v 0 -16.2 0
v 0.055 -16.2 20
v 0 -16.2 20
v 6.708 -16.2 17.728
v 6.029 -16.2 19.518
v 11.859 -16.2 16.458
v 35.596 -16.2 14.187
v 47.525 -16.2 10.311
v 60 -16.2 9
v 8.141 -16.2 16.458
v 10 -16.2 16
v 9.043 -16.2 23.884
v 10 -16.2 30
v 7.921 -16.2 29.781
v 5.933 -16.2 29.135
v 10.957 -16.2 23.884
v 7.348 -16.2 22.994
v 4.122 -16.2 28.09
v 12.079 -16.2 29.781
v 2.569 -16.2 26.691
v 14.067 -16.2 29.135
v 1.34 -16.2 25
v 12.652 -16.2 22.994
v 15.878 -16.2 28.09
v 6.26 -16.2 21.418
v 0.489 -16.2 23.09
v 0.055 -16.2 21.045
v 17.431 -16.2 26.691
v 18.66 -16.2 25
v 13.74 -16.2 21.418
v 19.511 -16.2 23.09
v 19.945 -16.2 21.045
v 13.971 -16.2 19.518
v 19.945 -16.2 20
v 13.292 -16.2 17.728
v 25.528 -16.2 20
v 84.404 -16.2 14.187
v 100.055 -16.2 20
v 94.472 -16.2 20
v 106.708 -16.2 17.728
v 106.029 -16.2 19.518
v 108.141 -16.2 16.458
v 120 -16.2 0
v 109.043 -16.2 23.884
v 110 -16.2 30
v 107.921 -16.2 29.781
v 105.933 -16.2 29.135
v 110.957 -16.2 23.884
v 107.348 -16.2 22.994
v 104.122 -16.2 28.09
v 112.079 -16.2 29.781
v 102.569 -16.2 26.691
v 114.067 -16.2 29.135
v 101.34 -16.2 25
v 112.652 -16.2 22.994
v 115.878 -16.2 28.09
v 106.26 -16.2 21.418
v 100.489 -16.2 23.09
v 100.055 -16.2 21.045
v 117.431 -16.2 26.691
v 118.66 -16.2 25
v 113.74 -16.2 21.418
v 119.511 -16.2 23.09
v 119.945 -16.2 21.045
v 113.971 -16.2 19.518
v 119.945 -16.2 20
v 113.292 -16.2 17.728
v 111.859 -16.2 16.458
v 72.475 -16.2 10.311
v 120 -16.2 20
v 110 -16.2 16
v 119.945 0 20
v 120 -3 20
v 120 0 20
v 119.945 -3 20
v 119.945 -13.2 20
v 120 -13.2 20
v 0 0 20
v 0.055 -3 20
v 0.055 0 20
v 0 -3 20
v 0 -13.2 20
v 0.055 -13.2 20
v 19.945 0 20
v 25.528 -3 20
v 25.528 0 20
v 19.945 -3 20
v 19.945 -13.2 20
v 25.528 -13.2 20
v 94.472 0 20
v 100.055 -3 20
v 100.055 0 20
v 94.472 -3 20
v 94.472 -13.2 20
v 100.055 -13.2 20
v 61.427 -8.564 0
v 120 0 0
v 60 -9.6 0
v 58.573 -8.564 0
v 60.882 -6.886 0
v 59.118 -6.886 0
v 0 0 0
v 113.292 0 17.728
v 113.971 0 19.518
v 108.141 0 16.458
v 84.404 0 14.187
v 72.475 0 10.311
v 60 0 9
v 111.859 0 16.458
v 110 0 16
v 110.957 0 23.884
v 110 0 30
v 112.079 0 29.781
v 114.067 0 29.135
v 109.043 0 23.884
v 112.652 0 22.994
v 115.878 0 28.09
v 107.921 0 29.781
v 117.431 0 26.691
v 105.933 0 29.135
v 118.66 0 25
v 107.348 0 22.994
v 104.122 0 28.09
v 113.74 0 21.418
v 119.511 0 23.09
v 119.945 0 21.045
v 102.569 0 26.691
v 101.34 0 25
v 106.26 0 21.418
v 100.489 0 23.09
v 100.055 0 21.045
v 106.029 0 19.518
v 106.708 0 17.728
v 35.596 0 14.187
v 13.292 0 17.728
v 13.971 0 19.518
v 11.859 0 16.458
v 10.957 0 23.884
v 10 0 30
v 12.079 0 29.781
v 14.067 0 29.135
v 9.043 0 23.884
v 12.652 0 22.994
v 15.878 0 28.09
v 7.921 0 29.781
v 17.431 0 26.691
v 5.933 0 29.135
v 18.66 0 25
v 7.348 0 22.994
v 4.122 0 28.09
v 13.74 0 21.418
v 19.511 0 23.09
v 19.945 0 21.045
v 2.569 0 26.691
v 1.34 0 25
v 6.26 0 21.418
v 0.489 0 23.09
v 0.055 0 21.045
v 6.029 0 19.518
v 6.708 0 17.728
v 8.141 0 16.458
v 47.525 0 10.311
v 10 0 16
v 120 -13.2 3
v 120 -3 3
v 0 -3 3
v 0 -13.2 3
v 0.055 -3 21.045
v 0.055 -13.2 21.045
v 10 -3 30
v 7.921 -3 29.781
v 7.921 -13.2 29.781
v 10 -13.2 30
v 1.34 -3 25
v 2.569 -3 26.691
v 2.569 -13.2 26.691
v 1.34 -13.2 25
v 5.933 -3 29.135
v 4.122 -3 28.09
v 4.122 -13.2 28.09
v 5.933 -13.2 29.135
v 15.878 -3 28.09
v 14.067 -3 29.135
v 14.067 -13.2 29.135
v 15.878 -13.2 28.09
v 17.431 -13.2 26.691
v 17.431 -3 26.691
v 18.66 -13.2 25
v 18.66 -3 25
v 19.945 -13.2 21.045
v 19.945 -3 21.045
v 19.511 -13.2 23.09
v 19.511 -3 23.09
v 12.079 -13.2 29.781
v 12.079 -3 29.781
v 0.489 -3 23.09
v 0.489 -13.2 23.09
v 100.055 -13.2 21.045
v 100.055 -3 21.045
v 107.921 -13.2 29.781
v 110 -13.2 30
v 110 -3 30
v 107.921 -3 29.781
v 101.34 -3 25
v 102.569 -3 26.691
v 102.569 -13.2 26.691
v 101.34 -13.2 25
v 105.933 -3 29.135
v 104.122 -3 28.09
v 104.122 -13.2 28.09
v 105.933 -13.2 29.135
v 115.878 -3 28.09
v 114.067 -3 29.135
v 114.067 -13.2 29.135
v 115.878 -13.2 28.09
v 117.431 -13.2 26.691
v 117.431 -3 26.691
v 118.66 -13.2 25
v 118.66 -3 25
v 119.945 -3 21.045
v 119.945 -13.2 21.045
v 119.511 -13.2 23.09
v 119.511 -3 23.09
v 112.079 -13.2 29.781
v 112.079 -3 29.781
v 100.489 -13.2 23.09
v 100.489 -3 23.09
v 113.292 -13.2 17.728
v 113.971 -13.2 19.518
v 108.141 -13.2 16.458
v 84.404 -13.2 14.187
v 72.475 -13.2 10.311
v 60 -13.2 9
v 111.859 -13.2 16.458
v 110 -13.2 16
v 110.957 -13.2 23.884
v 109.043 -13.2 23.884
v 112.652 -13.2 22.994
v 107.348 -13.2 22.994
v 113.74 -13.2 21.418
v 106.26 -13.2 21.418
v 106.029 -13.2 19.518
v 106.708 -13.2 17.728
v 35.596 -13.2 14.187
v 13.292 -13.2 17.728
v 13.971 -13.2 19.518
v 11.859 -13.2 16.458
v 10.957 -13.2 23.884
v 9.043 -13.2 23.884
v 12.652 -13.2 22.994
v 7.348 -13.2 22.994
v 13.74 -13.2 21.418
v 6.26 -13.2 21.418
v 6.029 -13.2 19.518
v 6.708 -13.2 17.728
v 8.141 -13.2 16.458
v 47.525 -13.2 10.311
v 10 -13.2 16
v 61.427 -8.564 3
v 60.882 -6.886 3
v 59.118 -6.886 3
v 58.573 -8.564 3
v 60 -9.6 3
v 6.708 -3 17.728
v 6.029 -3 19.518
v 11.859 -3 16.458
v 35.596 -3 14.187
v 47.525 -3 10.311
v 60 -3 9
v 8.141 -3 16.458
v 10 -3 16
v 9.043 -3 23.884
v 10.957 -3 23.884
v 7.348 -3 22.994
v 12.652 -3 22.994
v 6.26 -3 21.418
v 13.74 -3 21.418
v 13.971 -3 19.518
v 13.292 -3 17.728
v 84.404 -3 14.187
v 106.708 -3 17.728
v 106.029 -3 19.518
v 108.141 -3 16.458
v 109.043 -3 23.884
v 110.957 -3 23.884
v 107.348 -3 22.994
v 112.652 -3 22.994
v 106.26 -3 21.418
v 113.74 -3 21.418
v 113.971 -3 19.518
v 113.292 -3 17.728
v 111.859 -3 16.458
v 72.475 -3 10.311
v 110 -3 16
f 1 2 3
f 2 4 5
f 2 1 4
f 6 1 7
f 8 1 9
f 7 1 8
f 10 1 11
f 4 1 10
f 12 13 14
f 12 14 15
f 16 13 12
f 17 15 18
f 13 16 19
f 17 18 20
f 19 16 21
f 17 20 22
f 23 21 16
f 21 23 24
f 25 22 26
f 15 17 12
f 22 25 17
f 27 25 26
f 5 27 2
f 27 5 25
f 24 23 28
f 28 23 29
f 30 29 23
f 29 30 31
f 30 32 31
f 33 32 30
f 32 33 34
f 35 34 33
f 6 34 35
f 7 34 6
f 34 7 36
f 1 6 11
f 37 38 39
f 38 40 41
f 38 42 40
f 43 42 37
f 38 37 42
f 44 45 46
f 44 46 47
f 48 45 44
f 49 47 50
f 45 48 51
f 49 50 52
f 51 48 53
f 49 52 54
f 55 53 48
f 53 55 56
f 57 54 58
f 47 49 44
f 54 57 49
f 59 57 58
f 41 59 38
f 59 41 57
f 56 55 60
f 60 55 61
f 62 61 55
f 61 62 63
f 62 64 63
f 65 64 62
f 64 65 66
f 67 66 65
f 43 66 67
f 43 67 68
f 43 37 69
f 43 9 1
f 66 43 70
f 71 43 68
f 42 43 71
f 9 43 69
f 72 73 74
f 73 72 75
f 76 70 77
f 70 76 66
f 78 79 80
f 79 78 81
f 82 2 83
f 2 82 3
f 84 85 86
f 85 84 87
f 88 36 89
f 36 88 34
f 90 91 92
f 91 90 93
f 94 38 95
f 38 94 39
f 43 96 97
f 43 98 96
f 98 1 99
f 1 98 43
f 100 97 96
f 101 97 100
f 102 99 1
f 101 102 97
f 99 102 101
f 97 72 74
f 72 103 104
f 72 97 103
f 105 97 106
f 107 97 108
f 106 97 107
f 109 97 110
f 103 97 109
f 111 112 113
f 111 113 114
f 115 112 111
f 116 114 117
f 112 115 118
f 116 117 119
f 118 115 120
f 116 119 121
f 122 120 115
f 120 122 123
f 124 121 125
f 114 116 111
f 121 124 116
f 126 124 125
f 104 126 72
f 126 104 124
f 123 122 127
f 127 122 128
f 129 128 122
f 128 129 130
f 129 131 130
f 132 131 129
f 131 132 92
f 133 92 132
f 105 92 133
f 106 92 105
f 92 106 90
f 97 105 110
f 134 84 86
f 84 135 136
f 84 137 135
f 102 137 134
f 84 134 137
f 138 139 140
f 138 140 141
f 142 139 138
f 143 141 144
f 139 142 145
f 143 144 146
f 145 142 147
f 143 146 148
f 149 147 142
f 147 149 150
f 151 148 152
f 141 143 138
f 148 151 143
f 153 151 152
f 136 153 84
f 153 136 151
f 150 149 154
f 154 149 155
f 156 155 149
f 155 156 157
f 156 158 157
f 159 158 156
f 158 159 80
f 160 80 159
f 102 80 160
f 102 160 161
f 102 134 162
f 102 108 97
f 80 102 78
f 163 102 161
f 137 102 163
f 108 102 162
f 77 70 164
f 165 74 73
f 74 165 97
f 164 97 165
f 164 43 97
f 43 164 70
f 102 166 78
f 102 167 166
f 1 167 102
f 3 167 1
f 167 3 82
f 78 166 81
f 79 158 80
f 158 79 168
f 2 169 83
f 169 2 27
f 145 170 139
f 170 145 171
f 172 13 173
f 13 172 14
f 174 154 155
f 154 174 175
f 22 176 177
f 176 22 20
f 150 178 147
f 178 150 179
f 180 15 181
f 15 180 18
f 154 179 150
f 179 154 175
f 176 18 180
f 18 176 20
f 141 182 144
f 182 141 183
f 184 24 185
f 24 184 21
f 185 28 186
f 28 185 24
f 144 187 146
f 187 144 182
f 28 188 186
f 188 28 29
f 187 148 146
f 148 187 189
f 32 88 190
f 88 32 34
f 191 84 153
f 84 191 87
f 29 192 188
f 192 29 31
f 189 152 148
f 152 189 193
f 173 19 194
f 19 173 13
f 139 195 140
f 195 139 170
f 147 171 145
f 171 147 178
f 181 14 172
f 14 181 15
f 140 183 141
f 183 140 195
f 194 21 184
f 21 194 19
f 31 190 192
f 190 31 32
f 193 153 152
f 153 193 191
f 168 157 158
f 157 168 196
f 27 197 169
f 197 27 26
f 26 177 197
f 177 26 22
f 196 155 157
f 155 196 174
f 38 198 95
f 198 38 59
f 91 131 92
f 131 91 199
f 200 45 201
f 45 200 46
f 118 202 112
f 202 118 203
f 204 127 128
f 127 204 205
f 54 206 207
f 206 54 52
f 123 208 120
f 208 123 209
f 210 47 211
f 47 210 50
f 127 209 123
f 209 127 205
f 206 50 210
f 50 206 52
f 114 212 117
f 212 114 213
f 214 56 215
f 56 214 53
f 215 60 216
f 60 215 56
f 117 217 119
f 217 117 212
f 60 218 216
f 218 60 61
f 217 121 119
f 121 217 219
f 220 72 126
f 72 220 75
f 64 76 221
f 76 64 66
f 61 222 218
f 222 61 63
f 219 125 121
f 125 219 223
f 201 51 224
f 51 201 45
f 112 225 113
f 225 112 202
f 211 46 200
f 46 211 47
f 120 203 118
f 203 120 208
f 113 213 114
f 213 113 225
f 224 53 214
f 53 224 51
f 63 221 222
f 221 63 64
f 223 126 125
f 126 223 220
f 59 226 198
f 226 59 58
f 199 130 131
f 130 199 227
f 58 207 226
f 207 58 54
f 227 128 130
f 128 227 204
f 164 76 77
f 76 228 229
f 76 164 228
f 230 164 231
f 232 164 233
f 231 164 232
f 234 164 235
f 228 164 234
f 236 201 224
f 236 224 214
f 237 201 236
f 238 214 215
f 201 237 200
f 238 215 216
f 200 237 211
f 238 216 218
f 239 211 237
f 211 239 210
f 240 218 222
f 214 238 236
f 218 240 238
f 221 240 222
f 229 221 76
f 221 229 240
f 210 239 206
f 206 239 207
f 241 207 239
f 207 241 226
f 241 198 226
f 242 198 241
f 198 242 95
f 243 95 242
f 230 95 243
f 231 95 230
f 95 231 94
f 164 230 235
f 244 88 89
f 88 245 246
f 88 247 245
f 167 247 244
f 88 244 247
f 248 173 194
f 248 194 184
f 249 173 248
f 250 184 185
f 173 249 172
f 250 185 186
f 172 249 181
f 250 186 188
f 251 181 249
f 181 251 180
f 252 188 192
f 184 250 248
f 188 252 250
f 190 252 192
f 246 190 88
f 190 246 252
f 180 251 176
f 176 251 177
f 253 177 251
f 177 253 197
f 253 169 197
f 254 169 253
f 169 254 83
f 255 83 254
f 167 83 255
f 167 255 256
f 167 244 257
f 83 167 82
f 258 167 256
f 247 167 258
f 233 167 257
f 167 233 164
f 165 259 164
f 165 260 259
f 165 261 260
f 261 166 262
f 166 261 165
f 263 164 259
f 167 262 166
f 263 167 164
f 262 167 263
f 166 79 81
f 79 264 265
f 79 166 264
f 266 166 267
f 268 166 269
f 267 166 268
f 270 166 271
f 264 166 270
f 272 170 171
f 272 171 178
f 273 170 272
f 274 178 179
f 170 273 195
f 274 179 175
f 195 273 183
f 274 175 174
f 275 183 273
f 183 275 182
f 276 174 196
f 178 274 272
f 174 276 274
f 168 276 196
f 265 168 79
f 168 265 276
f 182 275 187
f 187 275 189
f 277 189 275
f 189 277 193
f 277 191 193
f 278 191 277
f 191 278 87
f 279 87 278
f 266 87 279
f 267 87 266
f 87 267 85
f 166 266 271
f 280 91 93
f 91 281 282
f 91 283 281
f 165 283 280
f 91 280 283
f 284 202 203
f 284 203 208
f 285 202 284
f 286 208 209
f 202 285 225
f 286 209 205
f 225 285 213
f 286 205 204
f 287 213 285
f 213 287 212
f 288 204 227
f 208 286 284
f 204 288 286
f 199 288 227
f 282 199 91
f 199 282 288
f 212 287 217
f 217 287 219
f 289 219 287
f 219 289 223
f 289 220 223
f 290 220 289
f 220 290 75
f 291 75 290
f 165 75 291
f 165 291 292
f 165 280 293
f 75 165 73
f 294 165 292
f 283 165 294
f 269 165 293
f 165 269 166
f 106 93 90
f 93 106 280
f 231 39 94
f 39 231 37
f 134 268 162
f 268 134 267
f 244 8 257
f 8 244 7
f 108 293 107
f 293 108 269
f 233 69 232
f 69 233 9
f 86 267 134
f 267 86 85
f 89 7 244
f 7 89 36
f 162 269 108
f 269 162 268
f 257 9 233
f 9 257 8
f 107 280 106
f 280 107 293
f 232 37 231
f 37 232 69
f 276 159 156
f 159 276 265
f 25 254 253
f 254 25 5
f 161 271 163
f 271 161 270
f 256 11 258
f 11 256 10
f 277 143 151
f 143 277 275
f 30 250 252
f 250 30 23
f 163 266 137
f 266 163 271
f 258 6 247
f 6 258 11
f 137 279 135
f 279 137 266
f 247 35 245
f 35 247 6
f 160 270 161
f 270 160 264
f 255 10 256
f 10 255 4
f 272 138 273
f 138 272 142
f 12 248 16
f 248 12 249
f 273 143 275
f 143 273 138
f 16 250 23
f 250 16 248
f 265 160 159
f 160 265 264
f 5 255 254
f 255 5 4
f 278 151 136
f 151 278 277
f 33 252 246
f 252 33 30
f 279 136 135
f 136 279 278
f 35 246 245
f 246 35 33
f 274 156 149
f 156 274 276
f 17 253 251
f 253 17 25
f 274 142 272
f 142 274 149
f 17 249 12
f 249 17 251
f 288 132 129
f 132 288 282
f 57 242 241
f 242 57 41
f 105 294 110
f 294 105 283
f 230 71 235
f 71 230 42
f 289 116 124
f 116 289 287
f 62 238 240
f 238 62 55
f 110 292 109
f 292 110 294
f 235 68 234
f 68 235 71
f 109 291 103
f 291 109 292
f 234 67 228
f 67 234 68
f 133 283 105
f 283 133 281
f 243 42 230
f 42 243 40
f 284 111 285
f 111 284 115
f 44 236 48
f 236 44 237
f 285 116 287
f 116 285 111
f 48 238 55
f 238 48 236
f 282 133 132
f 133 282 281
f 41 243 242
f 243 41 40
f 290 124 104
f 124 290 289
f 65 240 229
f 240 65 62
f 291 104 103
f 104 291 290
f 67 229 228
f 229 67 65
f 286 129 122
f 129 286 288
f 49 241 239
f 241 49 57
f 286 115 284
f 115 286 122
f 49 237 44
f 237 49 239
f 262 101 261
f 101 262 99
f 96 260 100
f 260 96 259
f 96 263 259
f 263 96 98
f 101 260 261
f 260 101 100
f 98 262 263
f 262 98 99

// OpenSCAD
// Gopro Cable cam dolly
//
// Derivative of: http://www.thingiverse.com/thing:391146
tol = 0.01;

washer = 1.5;
pulley_bolt_diameter = 8;
pulley_depth = 7 + 2*washer + 0.2;
pulley_outer_radius = 10;

body_length = 120;
body_height = 20;

wall_thicknes = 3;

camera_bolt_diameter = 3;

remove = wall_thicknes + 6;

// calculations
slot_width = pulley_depth + 2*wall_thicknes;
remove_center = body_length/2 - 2*pulley_outer_radius;
//remove_radius = body_length/2 - 2*pulley_outer_radius;
remove_radius = body_length/2;

echo("Slot width", slot_width);

module pulley_outer()  {
	rotate([0,90,0]) cylinder(r=pulley_outer_radius, h=slot_width);
}

module pulley_bolt_hole() {
   rotate([0,90,0]) translate([0,0,-1]) cylinder(r=pulley_bolt_diameter/2, h=slot_width+2);
}

rotate([0,0,-90]) difference() {
	union() {
		// Main body
		cube([slot_width,body_length,body_height]);
		// Pulley outer
		translate([0, pulley_outer_radius, body_height]) pulley_outer();
		translate([0, body_length-pulley_outer_radius, body_height]) pulley_outer();
	}
	// Slot in main body
	translate([wall_thicknes,-tol,wall_thicknes]) cube([pulley_depth,body_length+2*tol,body_height+100]);

	// Remove center of body
	translate([-1,body_length/2,remove_radius+remove]) rotate([0,90,0]) cylinder(r=remove_radius, h=slot_width+2*wall_thicknes);

	// Hole for bolts
	translate([0, pulley_outer_radius, body_height]) pulley_bolt_hole();
	translate([0, body_length-pulley_outer_radius, body_height]) pulley_bolt_hole();

	// Hole for camera
	translate([slot_width/2,body_length/2,-tol/2]) cylinder(r=camera_bolt_diameter/2, h=wall_thicknes+tol);

}
